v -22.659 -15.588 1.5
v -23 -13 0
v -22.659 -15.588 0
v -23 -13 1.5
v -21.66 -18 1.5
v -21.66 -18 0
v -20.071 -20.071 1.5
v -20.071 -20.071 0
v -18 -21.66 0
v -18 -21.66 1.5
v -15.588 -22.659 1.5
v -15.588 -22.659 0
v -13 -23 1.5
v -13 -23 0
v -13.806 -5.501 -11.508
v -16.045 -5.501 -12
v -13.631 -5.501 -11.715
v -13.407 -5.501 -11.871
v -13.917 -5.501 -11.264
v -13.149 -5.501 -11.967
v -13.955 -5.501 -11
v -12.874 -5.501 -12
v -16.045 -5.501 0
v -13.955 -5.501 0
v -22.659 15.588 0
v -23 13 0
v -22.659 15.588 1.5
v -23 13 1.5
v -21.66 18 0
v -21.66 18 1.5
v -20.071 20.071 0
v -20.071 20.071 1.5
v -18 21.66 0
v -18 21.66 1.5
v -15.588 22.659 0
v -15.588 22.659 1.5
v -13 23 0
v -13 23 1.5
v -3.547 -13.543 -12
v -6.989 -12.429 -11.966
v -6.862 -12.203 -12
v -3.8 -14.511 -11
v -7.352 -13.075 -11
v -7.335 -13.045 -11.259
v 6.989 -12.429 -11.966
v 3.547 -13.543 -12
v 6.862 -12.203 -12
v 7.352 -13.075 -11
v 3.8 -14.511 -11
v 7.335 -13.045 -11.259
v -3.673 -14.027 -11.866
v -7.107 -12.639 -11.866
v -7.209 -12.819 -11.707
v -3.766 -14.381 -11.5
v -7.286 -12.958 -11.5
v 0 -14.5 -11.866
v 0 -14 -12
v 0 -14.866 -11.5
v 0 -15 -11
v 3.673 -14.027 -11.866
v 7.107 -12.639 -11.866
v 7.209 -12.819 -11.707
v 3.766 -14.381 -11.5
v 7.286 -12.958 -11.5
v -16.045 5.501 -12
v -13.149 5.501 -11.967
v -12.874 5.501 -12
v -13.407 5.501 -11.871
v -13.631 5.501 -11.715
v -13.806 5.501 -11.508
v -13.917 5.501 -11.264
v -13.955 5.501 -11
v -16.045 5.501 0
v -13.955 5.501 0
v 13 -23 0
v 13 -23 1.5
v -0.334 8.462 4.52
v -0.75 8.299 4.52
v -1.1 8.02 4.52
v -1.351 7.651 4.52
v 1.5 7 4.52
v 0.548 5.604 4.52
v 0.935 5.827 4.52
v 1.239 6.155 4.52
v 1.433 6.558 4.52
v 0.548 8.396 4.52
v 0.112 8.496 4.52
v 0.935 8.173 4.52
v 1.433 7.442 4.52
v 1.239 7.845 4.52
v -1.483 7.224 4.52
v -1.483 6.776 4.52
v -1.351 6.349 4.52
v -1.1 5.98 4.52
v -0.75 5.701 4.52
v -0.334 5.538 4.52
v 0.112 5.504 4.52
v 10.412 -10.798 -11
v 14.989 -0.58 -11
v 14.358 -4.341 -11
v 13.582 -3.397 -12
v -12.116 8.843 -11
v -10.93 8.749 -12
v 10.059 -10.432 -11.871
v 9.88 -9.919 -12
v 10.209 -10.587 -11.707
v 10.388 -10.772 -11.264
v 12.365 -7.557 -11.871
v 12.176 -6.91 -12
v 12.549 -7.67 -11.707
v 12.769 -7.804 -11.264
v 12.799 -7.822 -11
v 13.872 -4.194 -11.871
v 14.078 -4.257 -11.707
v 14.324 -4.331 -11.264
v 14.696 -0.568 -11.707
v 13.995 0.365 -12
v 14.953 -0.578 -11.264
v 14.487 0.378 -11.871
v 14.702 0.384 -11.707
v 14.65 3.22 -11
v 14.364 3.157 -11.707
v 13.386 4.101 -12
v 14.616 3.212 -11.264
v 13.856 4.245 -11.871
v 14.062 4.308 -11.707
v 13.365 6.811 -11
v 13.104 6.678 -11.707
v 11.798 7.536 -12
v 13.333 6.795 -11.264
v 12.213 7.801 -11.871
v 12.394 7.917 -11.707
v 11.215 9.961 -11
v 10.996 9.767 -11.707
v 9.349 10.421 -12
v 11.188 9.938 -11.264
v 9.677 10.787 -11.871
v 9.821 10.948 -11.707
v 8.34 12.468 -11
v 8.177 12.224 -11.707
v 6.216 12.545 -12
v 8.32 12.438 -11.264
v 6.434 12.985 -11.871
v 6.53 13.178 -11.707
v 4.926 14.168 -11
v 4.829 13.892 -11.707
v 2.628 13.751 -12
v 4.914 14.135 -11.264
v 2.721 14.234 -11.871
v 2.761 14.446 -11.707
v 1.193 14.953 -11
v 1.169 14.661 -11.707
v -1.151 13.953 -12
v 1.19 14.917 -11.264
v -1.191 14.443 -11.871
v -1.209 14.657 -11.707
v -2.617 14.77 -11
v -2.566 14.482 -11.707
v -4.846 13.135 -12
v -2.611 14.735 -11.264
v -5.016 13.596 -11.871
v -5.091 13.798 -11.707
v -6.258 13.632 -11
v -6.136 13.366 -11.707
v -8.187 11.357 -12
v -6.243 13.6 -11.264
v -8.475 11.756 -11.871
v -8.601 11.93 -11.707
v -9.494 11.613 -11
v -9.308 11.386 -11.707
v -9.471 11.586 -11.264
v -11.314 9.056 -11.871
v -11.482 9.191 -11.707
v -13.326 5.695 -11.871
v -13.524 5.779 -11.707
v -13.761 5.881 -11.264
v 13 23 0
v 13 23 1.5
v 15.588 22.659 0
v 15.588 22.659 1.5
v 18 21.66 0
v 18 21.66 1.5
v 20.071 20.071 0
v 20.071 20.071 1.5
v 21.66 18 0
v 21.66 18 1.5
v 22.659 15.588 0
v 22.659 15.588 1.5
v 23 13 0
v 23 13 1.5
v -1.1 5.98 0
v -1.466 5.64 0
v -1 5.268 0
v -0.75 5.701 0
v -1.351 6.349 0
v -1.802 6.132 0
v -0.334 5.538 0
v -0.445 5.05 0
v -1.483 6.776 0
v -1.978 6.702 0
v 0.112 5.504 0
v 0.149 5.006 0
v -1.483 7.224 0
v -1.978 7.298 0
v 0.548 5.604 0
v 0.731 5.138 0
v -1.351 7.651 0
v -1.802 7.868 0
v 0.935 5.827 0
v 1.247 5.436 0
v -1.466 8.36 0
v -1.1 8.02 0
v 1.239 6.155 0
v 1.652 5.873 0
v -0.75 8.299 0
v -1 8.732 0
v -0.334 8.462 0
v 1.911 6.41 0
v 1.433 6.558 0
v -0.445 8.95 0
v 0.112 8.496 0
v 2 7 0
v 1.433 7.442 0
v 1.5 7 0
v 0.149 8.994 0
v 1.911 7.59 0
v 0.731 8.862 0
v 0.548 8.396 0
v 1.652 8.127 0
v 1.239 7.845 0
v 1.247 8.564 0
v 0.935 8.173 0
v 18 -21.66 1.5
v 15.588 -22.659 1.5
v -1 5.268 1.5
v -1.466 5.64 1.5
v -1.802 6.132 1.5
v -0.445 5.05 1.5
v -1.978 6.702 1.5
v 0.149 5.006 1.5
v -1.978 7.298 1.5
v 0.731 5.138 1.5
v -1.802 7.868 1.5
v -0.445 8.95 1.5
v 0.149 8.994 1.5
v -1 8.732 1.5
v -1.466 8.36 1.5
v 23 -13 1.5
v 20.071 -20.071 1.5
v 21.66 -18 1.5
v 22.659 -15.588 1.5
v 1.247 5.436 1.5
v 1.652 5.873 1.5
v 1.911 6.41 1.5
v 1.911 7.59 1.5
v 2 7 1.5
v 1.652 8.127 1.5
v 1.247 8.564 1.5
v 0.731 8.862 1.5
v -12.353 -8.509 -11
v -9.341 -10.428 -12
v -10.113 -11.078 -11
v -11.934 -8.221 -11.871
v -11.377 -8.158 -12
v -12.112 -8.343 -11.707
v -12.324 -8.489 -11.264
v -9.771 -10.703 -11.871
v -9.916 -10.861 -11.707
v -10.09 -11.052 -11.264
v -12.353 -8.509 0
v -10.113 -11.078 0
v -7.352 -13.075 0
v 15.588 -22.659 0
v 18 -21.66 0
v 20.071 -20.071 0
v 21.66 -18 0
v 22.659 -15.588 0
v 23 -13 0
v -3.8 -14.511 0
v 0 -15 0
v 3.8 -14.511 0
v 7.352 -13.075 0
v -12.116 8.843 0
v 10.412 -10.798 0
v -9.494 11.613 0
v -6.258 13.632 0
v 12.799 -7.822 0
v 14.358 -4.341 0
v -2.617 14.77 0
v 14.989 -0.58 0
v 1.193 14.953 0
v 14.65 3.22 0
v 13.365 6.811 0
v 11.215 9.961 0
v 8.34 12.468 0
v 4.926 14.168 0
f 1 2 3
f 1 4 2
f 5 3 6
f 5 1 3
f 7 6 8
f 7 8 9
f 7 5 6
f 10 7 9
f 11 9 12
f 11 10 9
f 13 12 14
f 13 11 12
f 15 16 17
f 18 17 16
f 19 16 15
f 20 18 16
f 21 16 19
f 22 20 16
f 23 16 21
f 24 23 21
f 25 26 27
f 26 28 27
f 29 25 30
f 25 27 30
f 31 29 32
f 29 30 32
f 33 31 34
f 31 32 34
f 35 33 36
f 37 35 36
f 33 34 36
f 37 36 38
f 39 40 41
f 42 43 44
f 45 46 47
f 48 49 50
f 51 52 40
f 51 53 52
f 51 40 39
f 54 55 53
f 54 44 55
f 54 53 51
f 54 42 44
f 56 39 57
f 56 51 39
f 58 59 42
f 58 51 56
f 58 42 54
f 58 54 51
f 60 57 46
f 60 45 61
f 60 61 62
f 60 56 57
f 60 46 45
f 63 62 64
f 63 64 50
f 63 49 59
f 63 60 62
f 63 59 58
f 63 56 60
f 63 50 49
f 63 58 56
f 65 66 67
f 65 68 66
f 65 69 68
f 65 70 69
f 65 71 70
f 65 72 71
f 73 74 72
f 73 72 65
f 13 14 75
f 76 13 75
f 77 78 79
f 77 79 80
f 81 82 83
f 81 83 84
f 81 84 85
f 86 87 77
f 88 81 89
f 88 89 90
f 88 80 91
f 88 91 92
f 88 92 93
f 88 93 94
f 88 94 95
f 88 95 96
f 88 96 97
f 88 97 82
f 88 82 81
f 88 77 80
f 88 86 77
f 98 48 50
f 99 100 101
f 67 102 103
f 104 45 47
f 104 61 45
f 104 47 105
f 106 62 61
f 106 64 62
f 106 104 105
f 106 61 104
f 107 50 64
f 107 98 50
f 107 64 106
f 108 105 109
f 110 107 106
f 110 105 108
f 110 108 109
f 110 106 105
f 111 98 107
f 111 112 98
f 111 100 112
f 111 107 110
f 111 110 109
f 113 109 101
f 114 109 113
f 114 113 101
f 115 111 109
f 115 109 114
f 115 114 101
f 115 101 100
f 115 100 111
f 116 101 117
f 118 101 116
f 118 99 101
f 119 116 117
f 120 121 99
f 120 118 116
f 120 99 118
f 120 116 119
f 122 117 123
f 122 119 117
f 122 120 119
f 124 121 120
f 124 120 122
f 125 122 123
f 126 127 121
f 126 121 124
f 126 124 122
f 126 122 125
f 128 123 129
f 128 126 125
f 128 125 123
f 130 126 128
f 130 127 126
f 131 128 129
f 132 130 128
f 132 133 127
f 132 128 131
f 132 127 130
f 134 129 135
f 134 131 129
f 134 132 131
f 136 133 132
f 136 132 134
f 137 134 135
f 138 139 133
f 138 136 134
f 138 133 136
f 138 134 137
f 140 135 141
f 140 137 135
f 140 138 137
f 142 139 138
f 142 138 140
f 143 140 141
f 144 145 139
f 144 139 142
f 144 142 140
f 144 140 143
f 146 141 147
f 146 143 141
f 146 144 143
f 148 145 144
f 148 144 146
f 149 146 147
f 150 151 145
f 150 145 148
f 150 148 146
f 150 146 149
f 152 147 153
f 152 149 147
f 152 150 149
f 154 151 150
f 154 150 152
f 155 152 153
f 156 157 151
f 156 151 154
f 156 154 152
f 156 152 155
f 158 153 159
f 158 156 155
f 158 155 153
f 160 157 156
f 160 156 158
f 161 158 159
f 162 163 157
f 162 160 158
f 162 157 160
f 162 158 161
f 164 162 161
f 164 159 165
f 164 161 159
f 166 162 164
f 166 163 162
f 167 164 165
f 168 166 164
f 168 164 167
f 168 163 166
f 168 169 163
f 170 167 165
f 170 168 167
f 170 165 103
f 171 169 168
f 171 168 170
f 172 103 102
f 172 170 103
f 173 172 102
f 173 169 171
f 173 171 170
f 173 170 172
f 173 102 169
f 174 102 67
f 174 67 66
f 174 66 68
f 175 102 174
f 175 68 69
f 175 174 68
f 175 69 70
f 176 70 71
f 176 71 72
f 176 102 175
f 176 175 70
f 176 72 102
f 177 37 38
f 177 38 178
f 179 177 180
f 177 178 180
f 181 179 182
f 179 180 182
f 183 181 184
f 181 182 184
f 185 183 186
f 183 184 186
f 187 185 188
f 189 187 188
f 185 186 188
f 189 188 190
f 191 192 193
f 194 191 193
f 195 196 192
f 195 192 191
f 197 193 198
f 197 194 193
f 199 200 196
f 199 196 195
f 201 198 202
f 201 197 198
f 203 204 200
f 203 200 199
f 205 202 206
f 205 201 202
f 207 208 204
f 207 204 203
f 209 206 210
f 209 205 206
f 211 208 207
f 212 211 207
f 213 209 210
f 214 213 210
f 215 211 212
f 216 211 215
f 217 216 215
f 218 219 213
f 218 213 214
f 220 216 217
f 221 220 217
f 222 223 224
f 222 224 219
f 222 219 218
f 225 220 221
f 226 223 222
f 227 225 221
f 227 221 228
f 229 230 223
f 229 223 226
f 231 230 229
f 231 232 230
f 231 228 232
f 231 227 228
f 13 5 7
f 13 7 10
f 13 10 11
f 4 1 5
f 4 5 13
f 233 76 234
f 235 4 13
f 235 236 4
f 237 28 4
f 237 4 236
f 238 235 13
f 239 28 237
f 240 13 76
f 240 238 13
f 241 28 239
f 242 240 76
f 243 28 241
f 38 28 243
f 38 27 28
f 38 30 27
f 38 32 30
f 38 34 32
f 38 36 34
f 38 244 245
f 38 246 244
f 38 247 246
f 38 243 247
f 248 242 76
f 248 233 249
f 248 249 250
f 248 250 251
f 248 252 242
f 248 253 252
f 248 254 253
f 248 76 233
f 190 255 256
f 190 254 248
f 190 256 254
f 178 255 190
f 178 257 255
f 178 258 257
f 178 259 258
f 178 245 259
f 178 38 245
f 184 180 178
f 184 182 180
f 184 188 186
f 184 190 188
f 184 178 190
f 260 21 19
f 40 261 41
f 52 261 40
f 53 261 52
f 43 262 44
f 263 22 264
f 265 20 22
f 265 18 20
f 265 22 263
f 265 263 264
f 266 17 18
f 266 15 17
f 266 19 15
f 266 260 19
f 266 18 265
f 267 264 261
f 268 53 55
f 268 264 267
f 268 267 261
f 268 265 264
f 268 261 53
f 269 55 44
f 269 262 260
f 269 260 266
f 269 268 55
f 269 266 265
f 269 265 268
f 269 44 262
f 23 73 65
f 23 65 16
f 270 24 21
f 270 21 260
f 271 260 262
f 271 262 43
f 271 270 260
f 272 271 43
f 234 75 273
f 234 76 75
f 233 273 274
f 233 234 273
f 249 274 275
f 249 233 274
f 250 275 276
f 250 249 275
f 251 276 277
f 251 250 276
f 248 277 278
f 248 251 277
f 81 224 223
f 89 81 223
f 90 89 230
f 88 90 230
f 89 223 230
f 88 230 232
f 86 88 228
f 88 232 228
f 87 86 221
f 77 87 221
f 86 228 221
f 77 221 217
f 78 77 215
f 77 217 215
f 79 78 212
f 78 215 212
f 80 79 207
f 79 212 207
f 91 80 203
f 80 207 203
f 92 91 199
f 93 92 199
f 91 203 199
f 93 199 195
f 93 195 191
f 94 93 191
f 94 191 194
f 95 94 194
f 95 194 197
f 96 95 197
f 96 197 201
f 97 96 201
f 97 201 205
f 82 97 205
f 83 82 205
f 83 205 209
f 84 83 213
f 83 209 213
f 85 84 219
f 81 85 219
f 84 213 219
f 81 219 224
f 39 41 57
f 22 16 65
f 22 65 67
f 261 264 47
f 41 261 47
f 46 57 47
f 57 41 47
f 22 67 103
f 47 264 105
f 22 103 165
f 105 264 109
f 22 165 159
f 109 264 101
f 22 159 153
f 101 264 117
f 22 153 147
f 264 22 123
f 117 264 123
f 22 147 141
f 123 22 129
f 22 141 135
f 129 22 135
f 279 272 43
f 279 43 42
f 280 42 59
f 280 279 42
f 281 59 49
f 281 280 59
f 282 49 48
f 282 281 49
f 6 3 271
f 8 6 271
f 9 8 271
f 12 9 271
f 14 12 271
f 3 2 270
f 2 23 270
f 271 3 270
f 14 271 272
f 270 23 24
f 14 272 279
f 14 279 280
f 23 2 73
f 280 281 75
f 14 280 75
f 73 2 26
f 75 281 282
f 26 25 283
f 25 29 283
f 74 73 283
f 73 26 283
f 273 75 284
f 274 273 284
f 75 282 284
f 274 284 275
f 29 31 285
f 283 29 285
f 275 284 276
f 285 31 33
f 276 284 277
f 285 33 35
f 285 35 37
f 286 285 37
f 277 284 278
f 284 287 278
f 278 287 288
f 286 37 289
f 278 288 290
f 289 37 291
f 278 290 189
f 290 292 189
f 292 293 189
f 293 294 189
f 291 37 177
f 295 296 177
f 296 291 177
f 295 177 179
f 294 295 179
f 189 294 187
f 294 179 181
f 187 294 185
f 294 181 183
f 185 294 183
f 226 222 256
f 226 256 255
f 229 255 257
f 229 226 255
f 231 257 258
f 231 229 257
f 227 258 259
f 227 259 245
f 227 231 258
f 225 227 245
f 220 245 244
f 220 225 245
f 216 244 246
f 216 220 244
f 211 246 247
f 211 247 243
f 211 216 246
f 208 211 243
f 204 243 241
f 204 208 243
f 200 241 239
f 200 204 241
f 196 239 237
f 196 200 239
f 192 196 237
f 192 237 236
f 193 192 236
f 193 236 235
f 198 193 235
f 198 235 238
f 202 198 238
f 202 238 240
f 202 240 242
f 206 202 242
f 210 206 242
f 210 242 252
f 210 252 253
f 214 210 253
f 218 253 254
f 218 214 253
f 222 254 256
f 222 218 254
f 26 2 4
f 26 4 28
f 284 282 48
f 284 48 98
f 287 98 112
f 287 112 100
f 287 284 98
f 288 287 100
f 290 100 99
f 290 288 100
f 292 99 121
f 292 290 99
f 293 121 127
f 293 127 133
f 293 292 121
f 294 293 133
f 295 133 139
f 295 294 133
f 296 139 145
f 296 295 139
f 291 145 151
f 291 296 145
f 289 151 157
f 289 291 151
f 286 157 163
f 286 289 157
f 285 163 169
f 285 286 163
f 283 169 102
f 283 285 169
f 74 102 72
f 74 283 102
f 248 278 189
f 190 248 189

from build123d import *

# Parameters (mm, degrees)
SKETCH1_W           = 46
SKETCH1_H           = 46
SKETCH1_R           = 2
BOSS_EXTRUDE1_DEPTH = 1.5
BOSS_EXTRUDE2_DEPTH = 12
FILLET1_R           = 1
SKETCH4_R           = 1.5
BOSS_EXTRUDE3_DEPTH = 4.52
FILLET2_R           = 10


with BuildPart() as part:
    # Sketch1 → Boss-Extrude1 (new body)
    with BuildSketch(Plane.XY):
        Rectangle(SKETCH1_W, SKETCH1_H)
        with Locations((0, 7)):
            Circle(SKETCH1_R, mode=Mode.SUBTRACT)
    extrude(amount=BOSS_EXTRUDE1_DEPTH)

    # Sketch3 → Boss-Extrude2 (add)
    with BuildSketch(Plane(origin=(0, 0, 0), x_dir=(-1, 0, 0), z_dir=(0, 0, -1))):
        with BuildLine():
            Line((16.045296796, -5.501477845), (13.954703204, -5.501477845))
            ThreePointArc((13.954703204, -5.501477845), (11.306350983, -9.857303254), (7.352141129, -13.074632722))
            ThreePointArc((7.352141129, -13.074632722), (0, -15), (-7.352141129, -13.074632722))
            ThreePointArc((-7.352141129, -13.074632722), (-9.857303254, 11.306350983), (13.954703204, 5.501477845))
            Line((13.954703204, 5.501477845), (16.045296796, 5.501477845))
            Line((16.045296796, 5.501477845), (16.045296796, -5.501477845))
        make_face()
    extrude(amount=BOSS_EXTRUDE2_DEPTH)

    # Fillet1
    fillet1_edges = [part.edges().sort_by_distance(p)[0] for p in [
        (15, 0, -12),
    ]]
    fillet(fillet1_edges, radius=FILLET1_R)

    # Sketch4 → Boss-Extrude3 (add)
    with BuildSketch(Plane.XY):
        with Locations((0, 7)):
            Circle(SKETCH4_R)
    extrude(amount=BOSS_EXTRUDE3_DEPTH)

    # Fillet2
    fillet2_edges = [part.edges().sort_by_distance(p)[0] for p in [
        (23, -23, 0.75),
        (-23, -23, 0.75),
        (-23, 23, 0.75),
        (23, 23, 0.75),
    ]]
    fillet(fillet2_edges, radius=FILLET2_R)


solid = part.part
